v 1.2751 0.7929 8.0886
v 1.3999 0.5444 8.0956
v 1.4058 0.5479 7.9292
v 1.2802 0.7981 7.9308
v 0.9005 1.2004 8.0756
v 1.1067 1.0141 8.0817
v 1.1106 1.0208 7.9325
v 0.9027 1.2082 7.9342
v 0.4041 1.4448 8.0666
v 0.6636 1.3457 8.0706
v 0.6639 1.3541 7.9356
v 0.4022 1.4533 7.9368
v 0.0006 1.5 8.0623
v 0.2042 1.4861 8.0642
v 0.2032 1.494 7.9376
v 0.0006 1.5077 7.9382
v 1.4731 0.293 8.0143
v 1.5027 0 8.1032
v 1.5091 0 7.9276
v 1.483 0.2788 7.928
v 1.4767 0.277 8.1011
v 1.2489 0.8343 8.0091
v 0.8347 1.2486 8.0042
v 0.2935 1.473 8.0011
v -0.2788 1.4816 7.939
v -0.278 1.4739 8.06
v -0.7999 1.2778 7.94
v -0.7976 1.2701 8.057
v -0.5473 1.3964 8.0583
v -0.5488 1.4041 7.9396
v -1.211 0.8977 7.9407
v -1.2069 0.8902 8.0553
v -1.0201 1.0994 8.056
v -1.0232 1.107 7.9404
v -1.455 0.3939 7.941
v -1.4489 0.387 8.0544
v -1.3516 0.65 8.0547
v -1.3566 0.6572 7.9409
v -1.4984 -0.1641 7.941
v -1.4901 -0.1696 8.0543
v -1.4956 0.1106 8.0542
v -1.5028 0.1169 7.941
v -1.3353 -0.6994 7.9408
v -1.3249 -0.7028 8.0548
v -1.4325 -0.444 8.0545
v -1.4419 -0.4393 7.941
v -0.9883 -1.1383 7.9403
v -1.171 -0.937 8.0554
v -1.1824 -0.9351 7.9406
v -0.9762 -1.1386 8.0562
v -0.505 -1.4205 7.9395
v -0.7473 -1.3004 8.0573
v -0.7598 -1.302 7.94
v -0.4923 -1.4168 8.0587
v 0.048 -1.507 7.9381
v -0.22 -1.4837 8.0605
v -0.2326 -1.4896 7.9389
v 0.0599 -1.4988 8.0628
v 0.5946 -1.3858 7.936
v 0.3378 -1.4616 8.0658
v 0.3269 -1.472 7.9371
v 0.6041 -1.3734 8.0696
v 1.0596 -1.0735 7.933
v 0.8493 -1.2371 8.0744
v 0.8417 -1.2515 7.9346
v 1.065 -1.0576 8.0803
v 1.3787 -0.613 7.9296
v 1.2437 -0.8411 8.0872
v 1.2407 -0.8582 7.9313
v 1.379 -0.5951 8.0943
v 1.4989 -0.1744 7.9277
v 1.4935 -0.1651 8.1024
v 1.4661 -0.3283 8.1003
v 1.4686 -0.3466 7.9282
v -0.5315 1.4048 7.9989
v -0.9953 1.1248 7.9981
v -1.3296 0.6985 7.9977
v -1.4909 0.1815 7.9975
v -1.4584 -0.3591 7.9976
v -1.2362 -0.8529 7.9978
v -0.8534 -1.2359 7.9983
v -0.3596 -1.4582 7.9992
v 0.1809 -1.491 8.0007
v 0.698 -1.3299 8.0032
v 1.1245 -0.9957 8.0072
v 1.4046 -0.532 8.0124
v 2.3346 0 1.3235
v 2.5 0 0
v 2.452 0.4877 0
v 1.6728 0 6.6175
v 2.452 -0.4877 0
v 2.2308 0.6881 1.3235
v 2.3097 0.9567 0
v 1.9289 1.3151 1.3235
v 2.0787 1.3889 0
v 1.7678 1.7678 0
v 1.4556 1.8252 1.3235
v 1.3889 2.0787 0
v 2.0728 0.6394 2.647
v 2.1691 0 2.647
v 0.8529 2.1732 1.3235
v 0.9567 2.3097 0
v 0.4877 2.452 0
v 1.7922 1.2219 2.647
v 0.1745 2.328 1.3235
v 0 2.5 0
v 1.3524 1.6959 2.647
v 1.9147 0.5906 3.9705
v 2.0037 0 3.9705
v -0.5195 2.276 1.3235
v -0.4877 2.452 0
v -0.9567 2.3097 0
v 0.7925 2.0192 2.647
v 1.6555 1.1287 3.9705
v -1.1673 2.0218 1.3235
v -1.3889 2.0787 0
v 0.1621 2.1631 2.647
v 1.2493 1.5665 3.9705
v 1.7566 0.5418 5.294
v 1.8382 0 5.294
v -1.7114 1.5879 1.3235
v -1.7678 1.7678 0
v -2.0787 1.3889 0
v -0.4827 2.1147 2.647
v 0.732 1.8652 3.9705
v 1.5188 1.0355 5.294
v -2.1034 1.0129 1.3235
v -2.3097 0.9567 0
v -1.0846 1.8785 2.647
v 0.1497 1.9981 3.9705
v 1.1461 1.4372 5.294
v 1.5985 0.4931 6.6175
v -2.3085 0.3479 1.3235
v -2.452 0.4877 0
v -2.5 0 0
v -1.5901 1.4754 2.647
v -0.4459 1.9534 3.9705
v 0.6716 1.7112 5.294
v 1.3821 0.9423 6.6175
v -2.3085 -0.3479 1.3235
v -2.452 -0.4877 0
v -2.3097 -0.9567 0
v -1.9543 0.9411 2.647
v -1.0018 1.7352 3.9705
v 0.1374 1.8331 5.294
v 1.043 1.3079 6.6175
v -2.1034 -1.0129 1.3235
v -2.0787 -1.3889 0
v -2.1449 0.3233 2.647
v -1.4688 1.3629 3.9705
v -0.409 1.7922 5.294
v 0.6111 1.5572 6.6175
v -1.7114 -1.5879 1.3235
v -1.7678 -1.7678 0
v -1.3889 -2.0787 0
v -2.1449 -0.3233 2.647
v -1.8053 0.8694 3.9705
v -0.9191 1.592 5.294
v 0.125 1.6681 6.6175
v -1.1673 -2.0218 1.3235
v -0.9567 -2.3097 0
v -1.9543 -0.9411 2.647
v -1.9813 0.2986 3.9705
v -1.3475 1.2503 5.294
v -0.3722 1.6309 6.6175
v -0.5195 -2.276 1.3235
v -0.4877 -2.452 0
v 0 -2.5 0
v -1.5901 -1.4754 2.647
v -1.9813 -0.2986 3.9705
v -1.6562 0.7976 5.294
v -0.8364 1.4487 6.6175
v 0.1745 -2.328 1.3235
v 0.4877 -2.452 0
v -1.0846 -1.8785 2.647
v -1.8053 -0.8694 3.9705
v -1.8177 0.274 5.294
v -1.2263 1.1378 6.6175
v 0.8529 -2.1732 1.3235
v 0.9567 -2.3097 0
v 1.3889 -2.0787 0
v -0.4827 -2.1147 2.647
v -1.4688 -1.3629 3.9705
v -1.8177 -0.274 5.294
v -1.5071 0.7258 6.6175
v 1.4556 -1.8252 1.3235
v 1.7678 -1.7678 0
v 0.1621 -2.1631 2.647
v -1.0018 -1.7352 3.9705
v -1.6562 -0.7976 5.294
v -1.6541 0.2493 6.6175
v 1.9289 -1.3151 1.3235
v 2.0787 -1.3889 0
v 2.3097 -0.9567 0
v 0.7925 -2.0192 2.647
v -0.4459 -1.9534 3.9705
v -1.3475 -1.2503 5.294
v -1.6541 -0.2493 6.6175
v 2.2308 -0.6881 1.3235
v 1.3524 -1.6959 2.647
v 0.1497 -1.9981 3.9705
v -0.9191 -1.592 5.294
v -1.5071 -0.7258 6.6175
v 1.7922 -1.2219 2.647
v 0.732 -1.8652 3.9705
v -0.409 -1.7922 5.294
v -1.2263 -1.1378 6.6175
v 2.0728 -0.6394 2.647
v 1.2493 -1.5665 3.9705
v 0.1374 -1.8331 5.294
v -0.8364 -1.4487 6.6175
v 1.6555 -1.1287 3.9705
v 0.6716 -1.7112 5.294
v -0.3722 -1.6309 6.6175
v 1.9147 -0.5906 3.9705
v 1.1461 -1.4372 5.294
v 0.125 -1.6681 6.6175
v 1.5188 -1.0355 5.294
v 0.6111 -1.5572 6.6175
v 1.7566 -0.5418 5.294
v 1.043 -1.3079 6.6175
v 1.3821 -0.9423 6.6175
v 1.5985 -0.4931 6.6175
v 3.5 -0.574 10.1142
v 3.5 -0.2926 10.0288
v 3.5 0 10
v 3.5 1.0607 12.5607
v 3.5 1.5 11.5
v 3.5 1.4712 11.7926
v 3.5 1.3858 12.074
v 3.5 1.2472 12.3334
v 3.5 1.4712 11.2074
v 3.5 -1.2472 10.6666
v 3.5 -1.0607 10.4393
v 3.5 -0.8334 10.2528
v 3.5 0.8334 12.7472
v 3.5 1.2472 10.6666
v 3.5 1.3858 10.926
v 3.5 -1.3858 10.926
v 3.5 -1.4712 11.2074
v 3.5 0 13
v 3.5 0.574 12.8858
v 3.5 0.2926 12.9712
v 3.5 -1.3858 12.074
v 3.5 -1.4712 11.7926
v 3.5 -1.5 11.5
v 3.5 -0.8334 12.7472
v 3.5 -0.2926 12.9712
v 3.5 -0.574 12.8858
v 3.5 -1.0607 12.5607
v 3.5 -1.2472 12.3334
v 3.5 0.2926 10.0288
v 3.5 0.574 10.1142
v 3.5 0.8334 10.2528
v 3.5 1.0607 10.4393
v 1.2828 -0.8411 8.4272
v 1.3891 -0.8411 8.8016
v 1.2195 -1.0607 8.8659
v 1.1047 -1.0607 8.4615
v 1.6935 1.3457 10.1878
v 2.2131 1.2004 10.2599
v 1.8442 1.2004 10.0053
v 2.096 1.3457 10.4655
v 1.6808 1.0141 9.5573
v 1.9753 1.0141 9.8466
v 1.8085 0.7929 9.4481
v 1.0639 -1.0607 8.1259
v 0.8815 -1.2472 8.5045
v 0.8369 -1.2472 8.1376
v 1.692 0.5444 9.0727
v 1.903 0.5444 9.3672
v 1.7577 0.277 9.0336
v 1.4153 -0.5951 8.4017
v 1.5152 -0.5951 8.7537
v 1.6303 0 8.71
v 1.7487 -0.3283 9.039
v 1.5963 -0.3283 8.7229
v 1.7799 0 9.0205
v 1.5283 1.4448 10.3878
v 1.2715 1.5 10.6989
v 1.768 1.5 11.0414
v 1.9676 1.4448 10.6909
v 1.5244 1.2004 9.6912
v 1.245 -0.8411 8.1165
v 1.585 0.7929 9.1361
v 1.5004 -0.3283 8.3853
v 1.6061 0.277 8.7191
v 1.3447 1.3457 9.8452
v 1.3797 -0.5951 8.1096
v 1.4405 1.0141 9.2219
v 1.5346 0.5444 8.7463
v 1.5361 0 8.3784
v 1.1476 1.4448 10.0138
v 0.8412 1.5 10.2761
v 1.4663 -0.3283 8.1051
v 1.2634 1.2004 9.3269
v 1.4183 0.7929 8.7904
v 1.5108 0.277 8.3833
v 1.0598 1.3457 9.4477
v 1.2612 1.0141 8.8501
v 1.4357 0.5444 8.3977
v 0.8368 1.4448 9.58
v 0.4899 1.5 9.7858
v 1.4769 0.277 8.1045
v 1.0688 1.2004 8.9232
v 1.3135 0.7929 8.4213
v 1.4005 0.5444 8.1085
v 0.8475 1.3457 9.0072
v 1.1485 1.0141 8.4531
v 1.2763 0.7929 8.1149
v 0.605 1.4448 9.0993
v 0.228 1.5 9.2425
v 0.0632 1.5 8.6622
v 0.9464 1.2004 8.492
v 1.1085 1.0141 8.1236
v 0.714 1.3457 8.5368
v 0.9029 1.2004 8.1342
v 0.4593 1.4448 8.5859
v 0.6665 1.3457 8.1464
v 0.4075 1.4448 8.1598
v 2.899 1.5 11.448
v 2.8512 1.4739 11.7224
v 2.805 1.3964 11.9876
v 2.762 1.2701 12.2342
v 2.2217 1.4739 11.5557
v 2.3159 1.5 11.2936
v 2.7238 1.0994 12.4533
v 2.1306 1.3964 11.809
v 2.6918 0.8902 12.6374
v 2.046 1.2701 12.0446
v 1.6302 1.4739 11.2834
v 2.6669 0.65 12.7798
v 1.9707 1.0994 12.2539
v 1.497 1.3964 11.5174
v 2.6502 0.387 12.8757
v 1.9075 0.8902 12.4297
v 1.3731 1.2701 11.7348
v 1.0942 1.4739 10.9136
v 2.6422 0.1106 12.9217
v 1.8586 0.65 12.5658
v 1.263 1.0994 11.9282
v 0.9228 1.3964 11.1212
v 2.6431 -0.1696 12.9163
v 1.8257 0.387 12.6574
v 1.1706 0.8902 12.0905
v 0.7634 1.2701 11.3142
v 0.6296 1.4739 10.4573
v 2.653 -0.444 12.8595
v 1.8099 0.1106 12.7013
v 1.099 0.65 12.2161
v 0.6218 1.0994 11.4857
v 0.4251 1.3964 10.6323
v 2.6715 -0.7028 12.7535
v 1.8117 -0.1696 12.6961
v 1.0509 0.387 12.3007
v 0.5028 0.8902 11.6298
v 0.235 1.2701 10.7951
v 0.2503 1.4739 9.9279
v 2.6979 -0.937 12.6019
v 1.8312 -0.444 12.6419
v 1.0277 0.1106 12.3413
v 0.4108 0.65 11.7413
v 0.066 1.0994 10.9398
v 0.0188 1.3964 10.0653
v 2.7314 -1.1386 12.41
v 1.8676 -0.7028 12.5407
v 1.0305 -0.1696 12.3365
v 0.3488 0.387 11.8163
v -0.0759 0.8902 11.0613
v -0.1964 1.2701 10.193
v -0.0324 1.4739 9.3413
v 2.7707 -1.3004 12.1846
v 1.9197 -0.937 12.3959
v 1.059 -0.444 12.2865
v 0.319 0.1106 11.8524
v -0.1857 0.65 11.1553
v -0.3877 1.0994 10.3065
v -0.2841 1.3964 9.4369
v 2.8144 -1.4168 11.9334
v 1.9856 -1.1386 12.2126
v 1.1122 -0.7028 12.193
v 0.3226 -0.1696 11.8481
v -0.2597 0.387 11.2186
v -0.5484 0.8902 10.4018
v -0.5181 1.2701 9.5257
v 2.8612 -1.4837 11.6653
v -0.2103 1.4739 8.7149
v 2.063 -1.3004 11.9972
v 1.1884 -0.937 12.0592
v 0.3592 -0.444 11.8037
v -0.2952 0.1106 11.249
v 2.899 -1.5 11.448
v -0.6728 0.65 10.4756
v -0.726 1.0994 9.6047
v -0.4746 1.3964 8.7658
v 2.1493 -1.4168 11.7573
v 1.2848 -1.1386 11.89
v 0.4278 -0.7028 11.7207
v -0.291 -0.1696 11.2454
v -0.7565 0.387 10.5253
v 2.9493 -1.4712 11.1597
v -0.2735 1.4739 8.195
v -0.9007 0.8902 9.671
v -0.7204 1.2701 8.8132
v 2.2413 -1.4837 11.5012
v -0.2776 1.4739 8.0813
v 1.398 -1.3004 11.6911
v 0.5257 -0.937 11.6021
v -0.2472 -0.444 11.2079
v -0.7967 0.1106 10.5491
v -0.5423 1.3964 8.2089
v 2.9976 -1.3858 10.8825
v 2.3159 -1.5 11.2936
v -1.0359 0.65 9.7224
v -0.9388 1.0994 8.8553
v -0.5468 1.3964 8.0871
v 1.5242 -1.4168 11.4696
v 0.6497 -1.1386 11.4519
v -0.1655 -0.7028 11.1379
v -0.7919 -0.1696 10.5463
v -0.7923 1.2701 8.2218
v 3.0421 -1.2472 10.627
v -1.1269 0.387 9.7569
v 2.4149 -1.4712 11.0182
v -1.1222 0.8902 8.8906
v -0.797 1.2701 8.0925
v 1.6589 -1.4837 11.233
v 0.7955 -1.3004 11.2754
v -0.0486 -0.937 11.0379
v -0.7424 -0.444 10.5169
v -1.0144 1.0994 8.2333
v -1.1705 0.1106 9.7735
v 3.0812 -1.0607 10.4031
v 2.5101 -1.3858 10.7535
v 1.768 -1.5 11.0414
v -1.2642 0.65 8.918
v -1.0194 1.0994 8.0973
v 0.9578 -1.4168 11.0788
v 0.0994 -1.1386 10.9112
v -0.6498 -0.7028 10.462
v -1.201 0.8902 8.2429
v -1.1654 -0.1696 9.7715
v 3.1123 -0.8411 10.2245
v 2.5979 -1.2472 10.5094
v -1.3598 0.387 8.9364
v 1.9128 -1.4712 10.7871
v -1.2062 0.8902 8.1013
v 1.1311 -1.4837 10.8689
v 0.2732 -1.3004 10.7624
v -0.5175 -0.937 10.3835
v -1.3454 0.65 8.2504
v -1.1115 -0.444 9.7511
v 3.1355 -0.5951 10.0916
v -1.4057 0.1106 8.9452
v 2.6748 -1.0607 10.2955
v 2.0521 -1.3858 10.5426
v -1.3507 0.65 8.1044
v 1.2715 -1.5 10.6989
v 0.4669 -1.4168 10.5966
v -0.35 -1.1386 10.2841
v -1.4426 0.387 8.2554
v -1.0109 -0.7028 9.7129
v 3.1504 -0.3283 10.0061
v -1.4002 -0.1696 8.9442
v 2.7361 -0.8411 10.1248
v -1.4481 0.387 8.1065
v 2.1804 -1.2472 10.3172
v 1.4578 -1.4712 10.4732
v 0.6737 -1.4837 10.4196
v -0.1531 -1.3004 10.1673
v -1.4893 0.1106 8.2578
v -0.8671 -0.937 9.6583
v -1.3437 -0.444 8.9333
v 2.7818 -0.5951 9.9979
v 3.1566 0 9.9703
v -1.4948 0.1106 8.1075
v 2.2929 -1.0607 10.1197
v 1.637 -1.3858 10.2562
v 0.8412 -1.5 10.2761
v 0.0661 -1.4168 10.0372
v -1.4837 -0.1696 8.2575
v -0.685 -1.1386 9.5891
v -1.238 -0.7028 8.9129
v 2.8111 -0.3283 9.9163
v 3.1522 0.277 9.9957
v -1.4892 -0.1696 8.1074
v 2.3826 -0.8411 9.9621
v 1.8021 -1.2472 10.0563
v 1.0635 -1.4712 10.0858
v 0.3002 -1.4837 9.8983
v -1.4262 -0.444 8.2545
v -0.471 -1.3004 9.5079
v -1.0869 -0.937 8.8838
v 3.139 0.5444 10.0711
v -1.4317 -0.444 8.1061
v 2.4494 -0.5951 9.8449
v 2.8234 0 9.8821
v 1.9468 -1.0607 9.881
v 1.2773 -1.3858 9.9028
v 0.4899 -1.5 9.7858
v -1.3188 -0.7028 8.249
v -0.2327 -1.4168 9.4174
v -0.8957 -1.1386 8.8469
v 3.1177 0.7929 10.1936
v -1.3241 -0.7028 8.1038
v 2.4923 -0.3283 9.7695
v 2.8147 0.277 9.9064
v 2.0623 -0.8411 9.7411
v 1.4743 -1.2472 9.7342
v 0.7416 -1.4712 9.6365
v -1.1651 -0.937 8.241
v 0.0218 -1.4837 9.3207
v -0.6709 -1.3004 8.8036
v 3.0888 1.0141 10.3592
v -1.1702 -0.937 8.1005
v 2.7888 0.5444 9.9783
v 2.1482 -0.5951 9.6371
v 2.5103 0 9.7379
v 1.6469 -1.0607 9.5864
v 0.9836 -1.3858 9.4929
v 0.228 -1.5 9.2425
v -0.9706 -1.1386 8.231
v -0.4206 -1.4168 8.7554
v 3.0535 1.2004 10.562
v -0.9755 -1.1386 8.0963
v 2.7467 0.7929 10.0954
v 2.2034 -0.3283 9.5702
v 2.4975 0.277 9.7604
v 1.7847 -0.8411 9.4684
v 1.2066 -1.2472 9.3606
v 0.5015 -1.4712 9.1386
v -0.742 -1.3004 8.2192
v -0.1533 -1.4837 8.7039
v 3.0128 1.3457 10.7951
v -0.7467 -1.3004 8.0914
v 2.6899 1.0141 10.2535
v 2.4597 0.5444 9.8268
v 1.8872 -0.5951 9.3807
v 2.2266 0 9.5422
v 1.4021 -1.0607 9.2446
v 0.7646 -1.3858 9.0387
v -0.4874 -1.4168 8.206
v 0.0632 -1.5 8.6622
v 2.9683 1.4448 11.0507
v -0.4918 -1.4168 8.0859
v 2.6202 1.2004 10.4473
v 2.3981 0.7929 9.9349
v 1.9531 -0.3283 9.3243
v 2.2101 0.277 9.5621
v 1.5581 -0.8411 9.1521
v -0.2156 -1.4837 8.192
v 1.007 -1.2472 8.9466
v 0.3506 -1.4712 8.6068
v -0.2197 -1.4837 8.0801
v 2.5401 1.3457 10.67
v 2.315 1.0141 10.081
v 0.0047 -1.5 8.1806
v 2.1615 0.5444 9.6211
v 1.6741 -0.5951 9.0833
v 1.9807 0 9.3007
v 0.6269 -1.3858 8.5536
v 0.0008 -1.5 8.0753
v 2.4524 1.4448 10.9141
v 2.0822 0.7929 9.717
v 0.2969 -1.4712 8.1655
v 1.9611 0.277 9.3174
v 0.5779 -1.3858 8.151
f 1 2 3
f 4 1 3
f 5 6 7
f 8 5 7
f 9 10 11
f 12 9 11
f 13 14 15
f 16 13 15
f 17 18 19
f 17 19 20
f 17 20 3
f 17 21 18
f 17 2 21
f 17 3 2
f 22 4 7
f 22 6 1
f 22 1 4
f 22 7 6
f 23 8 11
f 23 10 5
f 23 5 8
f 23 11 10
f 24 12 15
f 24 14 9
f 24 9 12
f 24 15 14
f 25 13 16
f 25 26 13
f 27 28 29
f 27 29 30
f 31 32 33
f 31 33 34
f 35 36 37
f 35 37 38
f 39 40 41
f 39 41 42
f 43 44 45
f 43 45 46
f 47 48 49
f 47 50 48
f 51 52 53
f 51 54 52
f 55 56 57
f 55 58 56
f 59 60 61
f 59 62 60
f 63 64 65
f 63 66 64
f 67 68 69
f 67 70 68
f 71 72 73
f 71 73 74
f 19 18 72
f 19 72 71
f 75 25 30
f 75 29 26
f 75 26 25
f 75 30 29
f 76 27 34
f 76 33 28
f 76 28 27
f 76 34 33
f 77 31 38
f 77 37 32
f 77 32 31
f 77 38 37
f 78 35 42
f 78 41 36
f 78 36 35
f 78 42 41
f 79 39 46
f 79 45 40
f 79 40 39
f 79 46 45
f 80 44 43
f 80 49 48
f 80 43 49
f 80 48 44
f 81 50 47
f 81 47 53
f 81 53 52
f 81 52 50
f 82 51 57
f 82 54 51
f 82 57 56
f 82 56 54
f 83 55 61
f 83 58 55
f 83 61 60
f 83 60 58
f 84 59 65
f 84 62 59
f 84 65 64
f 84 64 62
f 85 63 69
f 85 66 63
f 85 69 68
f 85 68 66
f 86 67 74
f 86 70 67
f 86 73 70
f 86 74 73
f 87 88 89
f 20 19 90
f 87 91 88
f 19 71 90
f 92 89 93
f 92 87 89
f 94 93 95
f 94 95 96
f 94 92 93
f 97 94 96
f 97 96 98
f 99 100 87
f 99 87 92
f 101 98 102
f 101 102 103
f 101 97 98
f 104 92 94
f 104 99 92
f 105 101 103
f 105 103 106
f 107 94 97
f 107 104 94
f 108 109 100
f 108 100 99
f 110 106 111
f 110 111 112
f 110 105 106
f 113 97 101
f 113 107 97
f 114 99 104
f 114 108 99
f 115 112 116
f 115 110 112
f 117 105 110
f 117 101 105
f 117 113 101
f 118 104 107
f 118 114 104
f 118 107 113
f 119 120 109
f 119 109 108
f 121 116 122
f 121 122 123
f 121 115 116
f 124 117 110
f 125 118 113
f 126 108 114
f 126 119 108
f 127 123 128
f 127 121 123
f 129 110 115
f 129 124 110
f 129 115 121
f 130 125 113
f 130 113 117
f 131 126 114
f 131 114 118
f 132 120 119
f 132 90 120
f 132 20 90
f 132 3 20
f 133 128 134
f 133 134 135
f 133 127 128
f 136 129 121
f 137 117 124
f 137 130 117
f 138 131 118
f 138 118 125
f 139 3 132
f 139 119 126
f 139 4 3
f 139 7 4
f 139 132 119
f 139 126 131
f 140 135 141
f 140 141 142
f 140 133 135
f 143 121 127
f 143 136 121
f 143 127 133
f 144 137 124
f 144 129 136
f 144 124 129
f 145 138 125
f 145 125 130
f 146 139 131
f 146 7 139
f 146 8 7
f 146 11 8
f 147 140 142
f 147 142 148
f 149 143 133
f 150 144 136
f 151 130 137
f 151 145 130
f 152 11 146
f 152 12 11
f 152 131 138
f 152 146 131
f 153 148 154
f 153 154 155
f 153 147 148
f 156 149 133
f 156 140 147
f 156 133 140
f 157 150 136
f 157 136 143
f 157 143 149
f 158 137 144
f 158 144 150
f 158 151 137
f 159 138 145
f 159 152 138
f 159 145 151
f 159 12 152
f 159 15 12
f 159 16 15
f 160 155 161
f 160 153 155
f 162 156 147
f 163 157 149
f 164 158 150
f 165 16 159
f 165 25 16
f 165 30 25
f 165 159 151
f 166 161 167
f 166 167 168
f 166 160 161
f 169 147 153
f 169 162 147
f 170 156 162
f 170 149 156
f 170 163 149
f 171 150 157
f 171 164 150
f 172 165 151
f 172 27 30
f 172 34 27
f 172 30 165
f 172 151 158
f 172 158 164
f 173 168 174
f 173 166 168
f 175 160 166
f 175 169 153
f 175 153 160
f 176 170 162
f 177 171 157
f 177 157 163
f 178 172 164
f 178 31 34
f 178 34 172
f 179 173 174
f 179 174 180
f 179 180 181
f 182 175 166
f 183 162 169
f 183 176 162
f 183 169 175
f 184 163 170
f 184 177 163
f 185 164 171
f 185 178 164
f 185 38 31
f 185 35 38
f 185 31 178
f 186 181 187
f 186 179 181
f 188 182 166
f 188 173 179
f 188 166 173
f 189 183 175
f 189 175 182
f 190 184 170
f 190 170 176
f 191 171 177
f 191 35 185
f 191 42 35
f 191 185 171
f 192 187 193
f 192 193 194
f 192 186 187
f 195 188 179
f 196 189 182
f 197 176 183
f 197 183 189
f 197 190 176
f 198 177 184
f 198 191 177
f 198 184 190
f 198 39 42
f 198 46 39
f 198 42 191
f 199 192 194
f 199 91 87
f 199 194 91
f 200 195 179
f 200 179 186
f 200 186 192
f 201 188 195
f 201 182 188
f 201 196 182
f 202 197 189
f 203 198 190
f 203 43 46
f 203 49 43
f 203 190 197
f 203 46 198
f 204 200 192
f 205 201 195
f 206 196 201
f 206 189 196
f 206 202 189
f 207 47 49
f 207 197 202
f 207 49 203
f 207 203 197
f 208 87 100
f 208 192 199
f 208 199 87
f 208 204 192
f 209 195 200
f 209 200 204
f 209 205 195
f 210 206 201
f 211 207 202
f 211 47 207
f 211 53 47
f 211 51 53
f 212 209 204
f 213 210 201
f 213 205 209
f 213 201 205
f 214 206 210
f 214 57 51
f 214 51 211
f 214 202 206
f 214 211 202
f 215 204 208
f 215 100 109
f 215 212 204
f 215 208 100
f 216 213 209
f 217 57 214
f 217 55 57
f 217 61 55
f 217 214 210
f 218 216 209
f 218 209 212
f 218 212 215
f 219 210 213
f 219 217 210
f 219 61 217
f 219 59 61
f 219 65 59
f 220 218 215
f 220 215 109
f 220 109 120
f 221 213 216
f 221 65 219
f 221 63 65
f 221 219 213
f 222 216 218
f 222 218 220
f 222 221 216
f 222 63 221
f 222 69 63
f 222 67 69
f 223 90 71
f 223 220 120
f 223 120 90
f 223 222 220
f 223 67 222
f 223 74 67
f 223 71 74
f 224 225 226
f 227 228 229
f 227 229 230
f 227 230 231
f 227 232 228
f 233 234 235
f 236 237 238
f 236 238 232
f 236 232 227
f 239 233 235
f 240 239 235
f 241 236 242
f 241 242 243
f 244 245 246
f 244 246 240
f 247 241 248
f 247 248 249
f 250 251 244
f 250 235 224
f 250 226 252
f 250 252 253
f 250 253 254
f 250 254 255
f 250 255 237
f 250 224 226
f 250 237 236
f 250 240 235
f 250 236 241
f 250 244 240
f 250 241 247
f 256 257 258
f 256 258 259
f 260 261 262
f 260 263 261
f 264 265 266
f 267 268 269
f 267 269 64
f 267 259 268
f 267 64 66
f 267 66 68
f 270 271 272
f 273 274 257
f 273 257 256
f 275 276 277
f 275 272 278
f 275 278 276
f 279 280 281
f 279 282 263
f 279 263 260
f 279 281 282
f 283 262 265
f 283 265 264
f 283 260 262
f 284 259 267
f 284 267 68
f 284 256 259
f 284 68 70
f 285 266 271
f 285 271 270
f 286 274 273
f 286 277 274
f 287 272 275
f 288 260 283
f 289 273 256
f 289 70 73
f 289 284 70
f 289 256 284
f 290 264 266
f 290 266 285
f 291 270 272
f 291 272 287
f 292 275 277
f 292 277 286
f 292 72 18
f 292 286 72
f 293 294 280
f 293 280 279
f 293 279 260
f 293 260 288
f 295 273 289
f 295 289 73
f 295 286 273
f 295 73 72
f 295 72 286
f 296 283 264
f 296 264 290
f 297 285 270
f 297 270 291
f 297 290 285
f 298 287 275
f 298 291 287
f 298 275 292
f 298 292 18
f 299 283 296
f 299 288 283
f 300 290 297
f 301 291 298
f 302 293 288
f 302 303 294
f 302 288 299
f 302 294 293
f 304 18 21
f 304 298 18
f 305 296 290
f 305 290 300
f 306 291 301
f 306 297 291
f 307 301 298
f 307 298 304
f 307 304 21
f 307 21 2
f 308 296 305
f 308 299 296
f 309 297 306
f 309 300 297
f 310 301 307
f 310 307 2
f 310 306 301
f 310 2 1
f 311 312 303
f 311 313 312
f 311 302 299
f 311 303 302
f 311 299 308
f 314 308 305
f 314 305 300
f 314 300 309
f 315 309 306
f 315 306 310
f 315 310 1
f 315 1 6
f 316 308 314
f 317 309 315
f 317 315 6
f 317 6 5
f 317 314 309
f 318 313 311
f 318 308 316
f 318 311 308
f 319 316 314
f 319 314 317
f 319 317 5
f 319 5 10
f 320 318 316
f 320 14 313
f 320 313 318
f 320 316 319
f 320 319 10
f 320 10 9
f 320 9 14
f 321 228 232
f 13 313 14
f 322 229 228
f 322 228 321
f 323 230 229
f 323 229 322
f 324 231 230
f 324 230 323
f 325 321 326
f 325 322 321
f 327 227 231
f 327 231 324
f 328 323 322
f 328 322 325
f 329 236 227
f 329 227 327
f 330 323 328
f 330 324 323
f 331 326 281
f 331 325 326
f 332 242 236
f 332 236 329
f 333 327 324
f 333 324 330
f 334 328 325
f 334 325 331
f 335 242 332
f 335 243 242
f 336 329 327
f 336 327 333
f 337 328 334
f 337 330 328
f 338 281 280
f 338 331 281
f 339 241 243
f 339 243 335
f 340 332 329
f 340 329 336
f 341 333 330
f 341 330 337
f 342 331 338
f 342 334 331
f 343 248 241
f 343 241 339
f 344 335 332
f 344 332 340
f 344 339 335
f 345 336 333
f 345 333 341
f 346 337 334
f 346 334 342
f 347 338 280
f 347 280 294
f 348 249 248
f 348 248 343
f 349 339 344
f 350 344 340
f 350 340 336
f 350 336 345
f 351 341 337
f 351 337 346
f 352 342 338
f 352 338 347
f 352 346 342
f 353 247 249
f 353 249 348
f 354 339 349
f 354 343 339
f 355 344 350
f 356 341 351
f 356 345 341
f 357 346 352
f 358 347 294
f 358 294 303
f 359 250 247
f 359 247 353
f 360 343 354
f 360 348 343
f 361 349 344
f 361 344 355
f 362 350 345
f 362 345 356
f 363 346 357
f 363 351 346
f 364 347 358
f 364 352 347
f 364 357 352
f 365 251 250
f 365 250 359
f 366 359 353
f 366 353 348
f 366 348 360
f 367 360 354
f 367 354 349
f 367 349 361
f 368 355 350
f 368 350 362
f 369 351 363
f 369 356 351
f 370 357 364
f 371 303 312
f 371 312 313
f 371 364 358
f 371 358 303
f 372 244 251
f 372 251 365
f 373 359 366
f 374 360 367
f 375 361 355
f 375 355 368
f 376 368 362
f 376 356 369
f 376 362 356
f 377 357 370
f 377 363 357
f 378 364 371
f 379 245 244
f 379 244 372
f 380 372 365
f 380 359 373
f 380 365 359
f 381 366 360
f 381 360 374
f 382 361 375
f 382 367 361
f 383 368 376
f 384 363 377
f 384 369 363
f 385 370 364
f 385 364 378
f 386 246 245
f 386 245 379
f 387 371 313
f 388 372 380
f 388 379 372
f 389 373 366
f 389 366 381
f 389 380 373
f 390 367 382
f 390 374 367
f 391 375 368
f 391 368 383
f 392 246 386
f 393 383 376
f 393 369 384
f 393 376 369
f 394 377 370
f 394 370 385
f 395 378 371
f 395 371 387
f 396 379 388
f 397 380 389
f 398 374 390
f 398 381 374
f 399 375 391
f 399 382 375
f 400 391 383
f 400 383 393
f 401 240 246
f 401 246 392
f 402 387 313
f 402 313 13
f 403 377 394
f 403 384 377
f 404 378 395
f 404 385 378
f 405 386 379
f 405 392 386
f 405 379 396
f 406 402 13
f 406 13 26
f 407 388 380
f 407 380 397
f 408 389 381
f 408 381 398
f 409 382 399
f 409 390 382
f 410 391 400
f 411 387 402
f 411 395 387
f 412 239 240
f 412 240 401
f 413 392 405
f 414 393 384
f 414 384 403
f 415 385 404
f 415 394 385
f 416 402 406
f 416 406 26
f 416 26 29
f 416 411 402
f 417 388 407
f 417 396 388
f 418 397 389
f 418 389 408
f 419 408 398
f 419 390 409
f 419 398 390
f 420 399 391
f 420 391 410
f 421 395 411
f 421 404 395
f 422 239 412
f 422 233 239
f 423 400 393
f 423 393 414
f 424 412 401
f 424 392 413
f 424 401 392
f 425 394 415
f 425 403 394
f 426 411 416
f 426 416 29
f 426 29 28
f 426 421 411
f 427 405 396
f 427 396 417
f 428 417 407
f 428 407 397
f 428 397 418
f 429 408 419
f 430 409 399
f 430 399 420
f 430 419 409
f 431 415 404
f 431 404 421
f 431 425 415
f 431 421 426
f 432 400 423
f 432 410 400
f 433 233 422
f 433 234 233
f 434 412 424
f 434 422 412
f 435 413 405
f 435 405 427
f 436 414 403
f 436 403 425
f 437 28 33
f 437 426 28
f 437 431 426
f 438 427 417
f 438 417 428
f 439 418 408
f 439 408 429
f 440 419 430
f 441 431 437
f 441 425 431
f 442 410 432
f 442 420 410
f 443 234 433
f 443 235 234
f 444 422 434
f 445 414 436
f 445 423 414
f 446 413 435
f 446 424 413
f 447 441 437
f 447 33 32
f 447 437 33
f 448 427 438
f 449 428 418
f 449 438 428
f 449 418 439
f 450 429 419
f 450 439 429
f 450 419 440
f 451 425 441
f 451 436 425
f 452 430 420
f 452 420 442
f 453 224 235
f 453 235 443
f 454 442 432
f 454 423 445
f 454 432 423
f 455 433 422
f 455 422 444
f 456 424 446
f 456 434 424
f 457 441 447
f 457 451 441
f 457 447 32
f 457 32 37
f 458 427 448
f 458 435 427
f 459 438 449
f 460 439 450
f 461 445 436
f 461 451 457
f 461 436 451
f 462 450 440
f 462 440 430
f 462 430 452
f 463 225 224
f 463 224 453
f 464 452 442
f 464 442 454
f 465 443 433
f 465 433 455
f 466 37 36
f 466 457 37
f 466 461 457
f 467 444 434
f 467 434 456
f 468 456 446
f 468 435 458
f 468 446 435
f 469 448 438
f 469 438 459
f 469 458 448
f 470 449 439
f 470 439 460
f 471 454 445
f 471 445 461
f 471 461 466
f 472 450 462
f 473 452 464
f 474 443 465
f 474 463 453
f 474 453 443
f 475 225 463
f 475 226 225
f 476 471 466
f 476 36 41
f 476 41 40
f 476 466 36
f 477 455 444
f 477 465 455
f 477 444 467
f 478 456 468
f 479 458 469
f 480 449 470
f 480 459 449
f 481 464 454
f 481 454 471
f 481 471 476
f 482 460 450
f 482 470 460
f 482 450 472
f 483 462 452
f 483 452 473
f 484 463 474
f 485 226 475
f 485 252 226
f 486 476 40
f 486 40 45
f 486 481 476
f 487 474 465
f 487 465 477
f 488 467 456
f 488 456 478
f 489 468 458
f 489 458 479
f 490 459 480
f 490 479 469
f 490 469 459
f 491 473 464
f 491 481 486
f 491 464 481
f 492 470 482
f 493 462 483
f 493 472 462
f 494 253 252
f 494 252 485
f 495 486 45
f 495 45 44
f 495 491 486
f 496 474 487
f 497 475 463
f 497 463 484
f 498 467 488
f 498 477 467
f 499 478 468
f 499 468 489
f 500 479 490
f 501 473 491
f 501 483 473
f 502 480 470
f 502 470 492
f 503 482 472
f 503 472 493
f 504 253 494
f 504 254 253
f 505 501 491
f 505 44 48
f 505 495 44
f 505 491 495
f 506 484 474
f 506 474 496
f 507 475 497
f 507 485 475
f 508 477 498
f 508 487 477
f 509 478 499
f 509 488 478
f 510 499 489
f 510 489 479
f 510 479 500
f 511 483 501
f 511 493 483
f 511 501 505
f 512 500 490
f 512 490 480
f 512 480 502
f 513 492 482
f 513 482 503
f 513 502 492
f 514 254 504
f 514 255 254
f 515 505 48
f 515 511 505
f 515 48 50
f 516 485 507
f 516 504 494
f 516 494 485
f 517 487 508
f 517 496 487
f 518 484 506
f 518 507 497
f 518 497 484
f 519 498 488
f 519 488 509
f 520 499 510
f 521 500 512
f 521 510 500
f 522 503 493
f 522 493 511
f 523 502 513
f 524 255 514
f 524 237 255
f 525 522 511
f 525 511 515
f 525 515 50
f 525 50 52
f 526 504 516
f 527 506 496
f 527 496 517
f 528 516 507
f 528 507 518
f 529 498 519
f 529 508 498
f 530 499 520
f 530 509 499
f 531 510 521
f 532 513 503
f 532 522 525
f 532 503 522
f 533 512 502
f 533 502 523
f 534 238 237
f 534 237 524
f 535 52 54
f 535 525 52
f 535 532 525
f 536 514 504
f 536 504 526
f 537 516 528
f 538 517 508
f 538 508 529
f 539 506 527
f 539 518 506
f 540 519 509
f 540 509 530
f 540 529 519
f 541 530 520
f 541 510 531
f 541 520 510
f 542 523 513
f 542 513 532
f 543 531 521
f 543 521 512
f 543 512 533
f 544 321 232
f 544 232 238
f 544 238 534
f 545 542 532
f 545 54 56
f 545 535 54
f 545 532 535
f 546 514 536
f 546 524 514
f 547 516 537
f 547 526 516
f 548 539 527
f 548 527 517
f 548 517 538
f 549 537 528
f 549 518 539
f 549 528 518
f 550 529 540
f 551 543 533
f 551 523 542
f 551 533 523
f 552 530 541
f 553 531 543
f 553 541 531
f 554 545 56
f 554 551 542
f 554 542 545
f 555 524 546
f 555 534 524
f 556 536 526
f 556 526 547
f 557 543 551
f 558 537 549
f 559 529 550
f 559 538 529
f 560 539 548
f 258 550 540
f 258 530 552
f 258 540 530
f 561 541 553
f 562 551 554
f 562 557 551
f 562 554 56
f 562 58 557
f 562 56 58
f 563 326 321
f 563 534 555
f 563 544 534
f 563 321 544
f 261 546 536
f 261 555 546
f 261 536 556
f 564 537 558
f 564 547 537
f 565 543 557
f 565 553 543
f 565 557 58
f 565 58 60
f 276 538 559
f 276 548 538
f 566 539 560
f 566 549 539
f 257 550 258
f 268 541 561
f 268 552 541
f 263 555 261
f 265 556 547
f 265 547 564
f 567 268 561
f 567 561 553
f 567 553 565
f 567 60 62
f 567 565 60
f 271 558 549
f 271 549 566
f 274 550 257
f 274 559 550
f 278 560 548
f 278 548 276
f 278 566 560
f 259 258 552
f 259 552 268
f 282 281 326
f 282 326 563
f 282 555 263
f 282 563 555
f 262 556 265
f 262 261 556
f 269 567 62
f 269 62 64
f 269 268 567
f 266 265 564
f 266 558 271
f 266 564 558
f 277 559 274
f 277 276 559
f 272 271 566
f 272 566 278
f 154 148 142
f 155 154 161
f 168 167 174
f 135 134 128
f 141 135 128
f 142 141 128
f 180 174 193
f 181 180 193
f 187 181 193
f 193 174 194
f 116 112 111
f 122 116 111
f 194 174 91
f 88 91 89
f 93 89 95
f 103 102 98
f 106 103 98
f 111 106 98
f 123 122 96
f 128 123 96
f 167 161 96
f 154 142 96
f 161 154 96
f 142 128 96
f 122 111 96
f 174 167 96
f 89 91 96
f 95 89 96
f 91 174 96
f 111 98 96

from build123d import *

# Parameters (mm, degrees)
F0_R = 2.5
F2_R = 1.5
F5_R = 1.5
F8_R = 1


with BuildPart() as f3:
    # F0 (on Top) → F3 section 0
    with BuildSketch(Plane.XY):
        Circle(F0_R)
    # F2 (on offset) → F3 section 1
    with BuildSketch(Plane.XY.offset(8)):
        Circle(F2_R)
    loft()

    # F7: sweep along a path in F6
    with BuildLine(Plane.XZ) as f7_path:
        ThreePointArc((3.5, 10.7476860285), (1.5570925767, 9.9429074233), (0.7523139715, 8))
    # F5 (on offset) → F7 (sweep)
    with BuildSketch(Plane.YZ.offset(3.5)):
        with Locations((0, 11.5)):
            Circle(F5_R)
    sweep(path=f7_path.line)

    # F8
    f8_edges = [f3.edges().sort_by_distance(p)[0] for p in [
        (-1.06066, -1.06066, 8),
    ]]
    fillet(f8_edges, radius=F8_R)


solid = f3.part
